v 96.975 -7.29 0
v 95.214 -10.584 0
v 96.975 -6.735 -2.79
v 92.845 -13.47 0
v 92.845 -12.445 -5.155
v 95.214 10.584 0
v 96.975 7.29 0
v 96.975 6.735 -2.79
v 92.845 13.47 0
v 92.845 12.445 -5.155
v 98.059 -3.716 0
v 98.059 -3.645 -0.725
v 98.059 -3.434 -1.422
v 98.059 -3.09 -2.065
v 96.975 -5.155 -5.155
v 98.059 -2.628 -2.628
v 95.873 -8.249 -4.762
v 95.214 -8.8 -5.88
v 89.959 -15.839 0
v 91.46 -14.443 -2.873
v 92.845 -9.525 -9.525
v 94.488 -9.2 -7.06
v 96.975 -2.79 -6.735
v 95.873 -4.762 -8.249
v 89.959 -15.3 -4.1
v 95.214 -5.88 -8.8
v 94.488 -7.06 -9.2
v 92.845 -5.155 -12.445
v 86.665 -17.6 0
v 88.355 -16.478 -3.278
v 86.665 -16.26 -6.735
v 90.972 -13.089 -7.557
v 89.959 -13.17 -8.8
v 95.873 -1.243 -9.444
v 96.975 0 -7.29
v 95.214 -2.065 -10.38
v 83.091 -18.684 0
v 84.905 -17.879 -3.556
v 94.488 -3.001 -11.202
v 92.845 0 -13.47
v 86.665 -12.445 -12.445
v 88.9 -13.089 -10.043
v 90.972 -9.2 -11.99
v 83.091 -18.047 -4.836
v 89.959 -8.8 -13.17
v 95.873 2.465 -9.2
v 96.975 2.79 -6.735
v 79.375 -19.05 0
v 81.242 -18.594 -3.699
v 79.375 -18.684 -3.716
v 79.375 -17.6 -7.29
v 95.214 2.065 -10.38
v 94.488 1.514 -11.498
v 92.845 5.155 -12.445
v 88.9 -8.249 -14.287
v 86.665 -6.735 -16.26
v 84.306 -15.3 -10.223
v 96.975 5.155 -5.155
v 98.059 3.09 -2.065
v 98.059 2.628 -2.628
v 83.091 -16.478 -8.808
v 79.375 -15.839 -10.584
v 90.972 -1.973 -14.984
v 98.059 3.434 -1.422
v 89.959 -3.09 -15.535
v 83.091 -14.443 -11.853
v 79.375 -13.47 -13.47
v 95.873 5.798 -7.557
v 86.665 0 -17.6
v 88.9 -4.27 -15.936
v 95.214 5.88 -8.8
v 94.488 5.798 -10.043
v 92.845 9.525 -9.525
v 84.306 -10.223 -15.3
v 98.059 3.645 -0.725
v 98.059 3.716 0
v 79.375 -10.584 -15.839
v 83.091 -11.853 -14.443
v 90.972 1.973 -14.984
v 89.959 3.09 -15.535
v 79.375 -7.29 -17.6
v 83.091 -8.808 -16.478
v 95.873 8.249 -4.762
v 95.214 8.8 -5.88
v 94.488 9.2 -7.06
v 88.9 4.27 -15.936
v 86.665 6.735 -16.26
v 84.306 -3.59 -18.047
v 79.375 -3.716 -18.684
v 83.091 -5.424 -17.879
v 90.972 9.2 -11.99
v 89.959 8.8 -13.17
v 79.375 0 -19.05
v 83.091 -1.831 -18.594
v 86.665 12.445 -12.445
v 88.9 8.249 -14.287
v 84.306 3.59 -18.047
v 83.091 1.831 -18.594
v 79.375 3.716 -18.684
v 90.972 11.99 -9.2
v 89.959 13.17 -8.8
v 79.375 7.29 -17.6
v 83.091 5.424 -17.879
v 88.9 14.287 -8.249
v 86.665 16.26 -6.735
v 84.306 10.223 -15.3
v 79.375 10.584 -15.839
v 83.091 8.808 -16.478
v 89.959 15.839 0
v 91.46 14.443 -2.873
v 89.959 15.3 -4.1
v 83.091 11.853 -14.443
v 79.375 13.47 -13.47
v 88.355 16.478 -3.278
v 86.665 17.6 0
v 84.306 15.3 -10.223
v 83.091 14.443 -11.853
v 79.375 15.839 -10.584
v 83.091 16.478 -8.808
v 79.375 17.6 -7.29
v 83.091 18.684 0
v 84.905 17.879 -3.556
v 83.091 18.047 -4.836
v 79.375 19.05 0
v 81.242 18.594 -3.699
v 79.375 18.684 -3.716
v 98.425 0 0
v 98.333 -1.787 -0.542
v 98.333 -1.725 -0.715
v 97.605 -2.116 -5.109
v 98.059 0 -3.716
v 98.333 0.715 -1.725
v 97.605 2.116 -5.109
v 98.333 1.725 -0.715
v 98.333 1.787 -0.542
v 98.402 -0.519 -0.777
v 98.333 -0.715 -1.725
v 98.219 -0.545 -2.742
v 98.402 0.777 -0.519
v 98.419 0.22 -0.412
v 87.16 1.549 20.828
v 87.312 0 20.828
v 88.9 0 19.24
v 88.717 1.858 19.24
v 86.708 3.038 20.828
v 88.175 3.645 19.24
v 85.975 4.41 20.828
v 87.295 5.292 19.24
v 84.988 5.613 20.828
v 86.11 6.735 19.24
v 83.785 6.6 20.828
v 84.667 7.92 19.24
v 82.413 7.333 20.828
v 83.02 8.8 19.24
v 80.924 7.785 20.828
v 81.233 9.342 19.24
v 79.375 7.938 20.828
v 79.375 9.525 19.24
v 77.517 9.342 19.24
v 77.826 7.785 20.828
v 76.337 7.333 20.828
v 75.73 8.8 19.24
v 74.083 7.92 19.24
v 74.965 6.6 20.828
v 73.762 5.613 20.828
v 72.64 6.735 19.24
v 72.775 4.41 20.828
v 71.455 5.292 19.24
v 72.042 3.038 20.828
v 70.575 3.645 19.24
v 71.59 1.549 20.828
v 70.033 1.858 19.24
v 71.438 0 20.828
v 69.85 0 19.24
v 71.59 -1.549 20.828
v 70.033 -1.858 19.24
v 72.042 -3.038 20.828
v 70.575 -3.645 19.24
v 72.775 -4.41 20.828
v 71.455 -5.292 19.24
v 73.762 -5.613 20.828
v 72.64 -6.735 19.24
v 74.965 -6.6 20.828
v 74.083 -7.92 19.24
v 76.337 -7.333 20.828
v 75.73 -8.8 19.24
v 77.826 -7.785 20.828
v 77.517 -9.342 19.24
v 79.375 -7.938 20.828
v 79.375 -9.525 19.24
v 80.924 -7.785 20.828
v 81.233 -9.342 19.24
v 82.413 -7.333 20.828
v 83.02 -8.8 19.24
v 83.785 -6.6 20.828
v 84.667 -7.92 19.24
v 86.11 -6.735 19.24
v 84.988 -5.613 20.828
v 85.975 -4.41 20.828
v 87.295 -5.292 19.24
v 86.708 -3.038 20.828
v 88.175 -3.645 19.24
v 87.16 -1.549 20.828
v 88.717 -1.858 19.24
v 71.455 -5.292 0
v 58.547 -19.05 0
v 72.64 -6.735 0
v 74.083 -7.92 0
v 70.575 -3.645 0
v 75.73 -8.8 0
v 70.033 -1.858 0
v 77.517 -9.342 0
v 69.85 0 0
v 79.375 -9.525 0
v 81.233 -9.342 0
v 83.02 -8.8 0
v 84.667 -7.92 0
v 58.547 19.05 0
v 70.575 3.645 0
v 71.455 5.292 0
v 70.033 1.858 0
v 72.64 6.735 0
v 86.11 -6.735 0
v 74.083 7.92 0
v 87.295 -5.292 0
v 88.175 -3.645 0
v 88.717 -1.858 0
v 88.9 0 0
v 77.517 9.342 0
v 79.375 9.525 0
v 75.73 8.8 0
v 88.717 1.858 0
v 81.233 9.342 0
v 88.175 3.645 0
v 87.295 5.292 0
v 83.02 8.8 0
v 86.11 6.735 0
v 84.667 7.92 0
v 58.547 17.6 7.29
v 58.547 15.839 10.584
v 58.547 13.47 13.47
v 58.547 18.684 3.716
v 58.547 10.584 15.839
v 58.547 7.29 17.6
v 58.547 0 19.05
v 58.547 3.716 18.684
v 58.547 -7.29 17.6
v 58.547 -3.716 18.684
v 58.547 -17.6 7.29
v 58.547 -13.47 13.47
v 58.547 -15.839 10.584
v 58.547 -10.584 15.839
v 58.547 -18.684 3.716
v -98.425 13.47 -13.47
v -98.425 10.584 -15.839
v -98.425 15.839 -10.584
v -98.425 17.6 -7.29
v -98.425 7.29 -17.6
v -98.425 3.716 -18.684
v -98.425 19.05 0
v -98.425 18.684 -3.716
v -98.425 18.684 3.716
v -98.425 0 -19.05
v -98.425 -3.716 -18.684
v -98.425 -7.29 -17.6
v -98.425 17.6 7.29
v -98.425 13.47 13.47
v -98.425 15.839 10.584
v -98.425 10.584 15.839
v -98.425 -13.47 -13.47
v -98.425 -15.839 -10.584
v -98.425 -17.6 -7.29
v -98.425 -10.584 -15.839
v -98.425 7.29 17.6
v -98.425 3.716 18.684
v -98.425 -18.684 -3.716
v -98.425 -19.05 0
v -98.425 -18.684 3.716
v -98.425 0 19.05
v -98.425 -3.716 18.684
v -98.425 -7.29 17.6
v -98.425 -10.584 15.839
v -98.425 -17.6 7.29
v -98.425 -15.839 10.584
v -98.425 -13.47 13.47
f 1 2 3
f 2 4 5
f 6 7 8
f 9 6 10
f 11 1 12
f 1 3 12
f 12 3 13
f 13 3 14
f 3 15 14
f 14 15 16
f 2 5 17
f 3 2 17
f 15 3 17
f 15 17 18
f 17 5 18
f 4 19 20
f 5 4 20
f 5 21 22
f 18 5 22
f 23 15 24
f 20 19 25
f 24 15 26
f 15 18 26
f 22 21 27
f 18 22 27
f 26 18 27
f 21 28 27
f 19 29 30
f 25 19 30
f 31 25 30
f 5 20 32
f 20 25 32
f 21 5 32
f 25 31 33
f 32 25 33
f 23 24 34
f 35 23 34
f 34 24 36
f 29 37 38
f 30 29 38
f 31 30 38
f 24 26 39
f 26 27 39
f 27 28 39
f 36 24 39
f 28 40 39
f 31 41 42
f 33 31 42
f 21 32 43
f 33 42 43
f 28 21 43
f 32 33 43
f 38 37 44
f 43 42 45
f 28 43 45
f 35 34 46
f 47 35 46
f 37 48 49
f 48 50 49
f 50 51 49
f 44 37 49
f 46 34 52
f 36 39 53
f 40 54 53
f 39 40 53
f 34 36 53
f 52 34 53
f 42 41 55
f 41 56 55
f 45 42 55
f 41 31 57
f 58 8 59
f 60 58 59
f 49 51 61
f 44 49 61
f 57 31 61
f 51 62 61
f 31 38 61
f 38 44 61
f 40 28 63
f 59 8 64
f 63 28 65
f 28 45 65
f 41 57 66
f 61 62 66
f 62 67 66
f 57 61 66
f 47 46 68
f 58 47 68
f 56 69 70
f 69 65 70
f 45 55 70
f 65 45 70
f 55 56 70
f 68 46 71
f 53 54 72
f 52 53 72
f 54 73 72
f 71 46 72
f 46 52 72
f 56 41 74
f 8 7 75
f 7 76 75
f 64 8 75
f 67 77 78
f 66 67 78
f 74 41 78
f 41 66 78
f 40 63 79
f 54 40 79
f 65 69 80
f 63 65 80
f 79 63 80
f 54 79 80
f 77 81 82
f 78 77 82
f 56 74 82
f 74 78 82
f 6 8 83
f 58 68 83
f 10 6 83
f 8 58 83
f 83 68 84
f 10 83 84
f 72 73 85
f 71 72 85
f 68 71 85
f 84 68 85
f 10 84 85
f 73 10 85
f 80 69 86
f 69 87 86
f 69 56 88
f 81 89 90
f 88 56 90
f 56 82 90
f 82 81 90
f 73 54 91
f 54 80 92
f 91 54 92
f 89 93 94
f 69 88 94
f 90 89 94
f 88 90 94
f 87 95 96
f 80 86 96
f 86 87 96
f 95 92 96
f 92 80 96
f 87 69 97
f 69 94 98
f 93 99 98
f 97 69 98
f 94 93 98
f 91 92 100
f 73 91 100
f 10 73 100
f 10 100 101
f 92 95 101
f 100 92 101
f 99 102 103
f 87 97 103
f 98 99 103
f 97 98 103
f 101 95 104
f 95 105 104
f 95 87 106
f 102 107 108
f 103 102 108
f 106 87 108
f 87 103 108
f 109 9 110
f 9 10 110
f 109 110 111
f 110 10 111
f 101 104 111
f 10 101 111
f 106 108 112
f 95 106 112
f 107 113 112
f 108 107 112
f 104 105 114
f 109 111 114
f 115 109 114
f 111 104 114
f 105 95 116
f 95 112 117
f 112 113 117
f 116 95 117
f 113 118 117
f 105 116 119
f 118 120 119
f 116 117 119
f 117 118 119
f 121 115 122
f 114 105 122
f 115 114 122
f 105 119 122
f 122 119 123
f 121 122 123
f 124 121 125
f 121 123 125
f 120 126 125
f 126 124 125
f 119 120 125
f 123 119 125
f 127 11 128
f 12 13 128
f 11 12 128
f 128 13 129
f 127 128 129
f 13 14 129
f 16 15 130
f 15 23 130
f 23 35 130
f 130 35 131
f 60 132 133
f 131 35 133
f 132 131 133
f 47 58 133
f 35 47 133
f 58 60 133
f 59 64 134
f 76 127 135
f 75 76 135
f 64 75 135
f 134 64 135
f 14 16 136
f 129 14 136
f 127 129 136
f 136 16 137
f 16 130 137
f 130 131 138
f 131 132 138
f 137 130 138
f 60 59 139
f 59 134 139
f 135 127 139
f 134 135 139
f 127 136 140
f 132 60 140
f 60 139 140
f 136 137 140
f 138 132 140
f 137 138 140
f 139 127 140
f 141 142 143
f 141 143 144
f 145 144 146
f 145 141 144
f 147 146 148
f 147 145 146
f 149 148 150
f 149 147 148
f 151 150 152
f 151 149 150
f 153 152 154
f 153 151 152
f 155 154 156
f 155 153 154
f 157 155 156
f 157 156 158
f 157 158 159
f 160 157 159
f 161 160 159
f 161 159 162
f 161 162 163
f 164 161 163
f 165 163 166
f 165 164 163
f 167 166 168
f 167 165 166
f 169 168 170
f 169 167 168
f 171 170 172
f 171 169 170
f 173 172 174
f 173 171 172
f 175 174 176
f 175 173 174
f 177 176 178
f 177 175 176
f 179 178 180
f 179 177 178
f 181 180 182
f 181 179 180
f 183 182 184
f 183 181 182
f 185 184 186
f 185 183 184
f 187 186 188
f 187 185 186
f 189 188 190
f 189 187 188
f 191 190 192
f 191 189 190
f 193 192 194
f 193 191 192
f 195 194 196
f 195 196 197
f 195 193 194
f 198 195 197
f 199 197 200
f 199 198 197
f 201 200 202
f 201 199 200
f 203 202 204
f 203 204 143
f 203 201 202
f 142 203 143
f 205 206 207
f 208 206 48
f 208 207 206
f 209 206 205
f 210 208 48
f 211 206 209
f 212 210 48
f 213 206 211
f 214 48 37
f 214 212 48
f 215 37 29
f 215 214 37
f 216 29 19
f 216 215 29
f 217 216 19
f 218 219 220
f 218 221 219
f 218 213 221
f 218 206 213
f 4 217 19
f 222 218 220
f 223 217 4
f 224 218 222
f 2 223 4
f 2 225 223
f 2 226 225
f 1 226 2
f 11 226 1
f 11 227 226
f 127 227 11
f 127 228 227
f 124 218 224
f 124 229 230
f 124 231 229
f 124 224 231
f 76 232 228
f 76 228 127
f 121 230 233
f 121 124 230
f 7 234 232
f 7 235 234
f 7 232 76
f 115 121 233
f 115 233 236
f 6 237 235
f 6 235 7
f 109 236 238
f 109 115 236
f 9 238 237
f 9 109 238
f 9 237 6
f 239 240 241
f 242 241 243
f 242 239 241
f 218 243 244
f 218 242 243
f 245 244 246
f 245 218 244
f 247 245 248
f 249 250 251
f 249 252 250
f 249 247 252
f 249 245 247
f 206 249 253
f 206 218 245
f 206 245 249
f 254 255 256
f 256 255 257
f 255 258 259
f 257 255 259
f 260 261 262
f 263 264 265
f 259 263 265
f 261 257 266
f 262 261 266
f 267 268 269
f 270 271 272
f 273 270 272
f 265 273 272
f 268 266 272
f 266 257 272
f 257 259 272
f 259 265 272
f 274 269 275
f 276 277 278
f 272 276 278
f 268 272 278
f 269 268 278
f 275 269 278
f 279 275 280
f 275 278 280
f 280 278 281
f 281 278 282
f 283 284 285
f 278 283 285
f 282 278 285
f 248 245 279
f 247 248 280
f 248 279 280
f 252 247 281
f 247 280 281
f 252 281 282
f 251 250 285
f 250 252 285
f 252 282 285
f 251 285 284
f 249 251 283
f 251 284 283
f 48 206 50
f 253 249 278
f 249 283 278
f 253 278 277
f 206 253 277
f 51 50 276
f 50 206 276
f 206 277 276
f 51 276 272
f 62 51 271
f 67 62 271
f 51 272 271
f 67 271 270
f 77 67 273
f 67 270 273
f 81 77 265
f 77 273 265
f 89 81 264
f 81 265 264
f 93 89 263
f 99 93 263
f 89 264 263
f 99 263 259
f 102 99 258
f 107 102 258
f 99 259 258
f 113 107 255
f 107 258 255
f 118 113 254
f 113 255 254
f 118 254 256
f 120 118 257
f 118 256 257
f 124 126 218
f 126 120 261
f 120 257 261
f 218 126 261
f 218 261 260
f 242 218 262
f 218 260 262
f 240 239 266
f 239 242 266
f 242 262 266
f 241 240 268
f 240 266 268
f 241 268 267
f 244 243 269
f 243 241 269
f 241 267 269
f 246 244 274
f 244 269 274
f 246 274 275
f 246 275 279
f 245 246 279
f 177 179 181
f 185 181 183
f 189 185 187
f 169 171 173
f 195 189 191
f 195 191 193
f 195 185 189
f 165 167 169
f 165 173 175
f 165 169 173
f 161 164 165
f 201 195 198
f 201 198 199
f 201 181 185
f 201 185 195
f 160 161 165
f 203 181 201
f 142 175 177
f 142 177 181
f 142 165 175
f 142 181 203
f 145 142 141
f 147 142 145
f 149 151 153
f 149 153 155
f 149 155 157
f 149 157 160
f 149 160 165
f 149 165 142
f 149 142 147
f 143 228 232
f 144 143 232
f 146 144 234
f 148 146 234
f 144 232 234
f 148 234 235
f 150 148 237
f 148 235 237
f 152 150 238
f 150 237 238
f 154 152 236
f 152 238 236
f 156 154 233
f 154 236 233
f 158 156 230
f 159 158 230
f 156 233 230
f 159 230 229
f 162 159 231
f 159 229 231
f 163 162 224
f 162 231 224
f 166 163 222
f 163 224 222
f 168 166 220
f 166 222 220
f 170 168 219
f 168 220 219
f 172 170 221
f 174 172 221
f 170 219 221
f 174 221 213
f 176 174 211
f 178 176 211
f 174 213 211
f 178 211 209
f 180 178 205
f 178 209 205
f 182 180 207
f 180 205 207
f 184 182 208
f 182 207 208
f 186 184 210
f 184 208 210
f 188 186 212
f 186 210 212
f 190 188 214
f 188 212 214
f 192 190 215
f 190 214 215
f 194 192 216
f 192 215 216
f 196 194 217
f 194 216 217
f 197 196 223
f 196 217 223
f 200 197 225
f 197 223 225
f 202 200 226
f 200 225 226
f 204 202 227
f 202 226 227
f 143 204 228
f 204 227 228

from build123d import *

# Parameters (mm, degrees)
F3_DEPTH = 25.4
F4_R     = 9.525
F5_DEPTH = 20.828
F6_SIZE  = 1.5875


with BuildPart() as f1:
    # F0 (on Front) → F1 (revolve)
    with BuildSketch(Plane.XZ):
        with BuildLine():
            Line((-98.425, 19.05), (-98.425, 0))
            Line((-98.425, 0), (98.425, 0))
            ThreePointArc((98.425, 0), (92.845384, 13.470384), (79.375, 19.05))
            Line((79.375, 19.05), (-98.425, 19.05))
        make_face()
    revolve(axis=Axis((0, 0, 0), (1, 0, 0)))

    # F2 (on Top) → F3 (cut)
    with BuildSketch(Plane.XY):
        with BuildLine():
            Line((79.375, 19.05), (58.547, 19.05))
            Line((58.547, 19.05), (58.547, -19.05))
            Line((58.547, -19.05), (79.375, -19.05))
            ThreePointArc((79.375, -19.05), (98.425, 0), (79.375, 19.05))
        make_face()
    extrude(amount=F3_DEPTH, mode=Mode.SUBTRACT)

    # F4 (on face) → F5 (join)
    with BuildSketch(Plane.XY):
        with Locations((79.375, 0)):
            Circle(F4_R)
    extrude(amount=F5_DEPTH)

    # F6
    f6_edges = [f1.edges().sort_by_distance(p)[0] for p in [
        (69.85, 0, 20.828),
    ]]
    chamfer(f6_edges, length=F6_SIZE)


solid = f1.part
